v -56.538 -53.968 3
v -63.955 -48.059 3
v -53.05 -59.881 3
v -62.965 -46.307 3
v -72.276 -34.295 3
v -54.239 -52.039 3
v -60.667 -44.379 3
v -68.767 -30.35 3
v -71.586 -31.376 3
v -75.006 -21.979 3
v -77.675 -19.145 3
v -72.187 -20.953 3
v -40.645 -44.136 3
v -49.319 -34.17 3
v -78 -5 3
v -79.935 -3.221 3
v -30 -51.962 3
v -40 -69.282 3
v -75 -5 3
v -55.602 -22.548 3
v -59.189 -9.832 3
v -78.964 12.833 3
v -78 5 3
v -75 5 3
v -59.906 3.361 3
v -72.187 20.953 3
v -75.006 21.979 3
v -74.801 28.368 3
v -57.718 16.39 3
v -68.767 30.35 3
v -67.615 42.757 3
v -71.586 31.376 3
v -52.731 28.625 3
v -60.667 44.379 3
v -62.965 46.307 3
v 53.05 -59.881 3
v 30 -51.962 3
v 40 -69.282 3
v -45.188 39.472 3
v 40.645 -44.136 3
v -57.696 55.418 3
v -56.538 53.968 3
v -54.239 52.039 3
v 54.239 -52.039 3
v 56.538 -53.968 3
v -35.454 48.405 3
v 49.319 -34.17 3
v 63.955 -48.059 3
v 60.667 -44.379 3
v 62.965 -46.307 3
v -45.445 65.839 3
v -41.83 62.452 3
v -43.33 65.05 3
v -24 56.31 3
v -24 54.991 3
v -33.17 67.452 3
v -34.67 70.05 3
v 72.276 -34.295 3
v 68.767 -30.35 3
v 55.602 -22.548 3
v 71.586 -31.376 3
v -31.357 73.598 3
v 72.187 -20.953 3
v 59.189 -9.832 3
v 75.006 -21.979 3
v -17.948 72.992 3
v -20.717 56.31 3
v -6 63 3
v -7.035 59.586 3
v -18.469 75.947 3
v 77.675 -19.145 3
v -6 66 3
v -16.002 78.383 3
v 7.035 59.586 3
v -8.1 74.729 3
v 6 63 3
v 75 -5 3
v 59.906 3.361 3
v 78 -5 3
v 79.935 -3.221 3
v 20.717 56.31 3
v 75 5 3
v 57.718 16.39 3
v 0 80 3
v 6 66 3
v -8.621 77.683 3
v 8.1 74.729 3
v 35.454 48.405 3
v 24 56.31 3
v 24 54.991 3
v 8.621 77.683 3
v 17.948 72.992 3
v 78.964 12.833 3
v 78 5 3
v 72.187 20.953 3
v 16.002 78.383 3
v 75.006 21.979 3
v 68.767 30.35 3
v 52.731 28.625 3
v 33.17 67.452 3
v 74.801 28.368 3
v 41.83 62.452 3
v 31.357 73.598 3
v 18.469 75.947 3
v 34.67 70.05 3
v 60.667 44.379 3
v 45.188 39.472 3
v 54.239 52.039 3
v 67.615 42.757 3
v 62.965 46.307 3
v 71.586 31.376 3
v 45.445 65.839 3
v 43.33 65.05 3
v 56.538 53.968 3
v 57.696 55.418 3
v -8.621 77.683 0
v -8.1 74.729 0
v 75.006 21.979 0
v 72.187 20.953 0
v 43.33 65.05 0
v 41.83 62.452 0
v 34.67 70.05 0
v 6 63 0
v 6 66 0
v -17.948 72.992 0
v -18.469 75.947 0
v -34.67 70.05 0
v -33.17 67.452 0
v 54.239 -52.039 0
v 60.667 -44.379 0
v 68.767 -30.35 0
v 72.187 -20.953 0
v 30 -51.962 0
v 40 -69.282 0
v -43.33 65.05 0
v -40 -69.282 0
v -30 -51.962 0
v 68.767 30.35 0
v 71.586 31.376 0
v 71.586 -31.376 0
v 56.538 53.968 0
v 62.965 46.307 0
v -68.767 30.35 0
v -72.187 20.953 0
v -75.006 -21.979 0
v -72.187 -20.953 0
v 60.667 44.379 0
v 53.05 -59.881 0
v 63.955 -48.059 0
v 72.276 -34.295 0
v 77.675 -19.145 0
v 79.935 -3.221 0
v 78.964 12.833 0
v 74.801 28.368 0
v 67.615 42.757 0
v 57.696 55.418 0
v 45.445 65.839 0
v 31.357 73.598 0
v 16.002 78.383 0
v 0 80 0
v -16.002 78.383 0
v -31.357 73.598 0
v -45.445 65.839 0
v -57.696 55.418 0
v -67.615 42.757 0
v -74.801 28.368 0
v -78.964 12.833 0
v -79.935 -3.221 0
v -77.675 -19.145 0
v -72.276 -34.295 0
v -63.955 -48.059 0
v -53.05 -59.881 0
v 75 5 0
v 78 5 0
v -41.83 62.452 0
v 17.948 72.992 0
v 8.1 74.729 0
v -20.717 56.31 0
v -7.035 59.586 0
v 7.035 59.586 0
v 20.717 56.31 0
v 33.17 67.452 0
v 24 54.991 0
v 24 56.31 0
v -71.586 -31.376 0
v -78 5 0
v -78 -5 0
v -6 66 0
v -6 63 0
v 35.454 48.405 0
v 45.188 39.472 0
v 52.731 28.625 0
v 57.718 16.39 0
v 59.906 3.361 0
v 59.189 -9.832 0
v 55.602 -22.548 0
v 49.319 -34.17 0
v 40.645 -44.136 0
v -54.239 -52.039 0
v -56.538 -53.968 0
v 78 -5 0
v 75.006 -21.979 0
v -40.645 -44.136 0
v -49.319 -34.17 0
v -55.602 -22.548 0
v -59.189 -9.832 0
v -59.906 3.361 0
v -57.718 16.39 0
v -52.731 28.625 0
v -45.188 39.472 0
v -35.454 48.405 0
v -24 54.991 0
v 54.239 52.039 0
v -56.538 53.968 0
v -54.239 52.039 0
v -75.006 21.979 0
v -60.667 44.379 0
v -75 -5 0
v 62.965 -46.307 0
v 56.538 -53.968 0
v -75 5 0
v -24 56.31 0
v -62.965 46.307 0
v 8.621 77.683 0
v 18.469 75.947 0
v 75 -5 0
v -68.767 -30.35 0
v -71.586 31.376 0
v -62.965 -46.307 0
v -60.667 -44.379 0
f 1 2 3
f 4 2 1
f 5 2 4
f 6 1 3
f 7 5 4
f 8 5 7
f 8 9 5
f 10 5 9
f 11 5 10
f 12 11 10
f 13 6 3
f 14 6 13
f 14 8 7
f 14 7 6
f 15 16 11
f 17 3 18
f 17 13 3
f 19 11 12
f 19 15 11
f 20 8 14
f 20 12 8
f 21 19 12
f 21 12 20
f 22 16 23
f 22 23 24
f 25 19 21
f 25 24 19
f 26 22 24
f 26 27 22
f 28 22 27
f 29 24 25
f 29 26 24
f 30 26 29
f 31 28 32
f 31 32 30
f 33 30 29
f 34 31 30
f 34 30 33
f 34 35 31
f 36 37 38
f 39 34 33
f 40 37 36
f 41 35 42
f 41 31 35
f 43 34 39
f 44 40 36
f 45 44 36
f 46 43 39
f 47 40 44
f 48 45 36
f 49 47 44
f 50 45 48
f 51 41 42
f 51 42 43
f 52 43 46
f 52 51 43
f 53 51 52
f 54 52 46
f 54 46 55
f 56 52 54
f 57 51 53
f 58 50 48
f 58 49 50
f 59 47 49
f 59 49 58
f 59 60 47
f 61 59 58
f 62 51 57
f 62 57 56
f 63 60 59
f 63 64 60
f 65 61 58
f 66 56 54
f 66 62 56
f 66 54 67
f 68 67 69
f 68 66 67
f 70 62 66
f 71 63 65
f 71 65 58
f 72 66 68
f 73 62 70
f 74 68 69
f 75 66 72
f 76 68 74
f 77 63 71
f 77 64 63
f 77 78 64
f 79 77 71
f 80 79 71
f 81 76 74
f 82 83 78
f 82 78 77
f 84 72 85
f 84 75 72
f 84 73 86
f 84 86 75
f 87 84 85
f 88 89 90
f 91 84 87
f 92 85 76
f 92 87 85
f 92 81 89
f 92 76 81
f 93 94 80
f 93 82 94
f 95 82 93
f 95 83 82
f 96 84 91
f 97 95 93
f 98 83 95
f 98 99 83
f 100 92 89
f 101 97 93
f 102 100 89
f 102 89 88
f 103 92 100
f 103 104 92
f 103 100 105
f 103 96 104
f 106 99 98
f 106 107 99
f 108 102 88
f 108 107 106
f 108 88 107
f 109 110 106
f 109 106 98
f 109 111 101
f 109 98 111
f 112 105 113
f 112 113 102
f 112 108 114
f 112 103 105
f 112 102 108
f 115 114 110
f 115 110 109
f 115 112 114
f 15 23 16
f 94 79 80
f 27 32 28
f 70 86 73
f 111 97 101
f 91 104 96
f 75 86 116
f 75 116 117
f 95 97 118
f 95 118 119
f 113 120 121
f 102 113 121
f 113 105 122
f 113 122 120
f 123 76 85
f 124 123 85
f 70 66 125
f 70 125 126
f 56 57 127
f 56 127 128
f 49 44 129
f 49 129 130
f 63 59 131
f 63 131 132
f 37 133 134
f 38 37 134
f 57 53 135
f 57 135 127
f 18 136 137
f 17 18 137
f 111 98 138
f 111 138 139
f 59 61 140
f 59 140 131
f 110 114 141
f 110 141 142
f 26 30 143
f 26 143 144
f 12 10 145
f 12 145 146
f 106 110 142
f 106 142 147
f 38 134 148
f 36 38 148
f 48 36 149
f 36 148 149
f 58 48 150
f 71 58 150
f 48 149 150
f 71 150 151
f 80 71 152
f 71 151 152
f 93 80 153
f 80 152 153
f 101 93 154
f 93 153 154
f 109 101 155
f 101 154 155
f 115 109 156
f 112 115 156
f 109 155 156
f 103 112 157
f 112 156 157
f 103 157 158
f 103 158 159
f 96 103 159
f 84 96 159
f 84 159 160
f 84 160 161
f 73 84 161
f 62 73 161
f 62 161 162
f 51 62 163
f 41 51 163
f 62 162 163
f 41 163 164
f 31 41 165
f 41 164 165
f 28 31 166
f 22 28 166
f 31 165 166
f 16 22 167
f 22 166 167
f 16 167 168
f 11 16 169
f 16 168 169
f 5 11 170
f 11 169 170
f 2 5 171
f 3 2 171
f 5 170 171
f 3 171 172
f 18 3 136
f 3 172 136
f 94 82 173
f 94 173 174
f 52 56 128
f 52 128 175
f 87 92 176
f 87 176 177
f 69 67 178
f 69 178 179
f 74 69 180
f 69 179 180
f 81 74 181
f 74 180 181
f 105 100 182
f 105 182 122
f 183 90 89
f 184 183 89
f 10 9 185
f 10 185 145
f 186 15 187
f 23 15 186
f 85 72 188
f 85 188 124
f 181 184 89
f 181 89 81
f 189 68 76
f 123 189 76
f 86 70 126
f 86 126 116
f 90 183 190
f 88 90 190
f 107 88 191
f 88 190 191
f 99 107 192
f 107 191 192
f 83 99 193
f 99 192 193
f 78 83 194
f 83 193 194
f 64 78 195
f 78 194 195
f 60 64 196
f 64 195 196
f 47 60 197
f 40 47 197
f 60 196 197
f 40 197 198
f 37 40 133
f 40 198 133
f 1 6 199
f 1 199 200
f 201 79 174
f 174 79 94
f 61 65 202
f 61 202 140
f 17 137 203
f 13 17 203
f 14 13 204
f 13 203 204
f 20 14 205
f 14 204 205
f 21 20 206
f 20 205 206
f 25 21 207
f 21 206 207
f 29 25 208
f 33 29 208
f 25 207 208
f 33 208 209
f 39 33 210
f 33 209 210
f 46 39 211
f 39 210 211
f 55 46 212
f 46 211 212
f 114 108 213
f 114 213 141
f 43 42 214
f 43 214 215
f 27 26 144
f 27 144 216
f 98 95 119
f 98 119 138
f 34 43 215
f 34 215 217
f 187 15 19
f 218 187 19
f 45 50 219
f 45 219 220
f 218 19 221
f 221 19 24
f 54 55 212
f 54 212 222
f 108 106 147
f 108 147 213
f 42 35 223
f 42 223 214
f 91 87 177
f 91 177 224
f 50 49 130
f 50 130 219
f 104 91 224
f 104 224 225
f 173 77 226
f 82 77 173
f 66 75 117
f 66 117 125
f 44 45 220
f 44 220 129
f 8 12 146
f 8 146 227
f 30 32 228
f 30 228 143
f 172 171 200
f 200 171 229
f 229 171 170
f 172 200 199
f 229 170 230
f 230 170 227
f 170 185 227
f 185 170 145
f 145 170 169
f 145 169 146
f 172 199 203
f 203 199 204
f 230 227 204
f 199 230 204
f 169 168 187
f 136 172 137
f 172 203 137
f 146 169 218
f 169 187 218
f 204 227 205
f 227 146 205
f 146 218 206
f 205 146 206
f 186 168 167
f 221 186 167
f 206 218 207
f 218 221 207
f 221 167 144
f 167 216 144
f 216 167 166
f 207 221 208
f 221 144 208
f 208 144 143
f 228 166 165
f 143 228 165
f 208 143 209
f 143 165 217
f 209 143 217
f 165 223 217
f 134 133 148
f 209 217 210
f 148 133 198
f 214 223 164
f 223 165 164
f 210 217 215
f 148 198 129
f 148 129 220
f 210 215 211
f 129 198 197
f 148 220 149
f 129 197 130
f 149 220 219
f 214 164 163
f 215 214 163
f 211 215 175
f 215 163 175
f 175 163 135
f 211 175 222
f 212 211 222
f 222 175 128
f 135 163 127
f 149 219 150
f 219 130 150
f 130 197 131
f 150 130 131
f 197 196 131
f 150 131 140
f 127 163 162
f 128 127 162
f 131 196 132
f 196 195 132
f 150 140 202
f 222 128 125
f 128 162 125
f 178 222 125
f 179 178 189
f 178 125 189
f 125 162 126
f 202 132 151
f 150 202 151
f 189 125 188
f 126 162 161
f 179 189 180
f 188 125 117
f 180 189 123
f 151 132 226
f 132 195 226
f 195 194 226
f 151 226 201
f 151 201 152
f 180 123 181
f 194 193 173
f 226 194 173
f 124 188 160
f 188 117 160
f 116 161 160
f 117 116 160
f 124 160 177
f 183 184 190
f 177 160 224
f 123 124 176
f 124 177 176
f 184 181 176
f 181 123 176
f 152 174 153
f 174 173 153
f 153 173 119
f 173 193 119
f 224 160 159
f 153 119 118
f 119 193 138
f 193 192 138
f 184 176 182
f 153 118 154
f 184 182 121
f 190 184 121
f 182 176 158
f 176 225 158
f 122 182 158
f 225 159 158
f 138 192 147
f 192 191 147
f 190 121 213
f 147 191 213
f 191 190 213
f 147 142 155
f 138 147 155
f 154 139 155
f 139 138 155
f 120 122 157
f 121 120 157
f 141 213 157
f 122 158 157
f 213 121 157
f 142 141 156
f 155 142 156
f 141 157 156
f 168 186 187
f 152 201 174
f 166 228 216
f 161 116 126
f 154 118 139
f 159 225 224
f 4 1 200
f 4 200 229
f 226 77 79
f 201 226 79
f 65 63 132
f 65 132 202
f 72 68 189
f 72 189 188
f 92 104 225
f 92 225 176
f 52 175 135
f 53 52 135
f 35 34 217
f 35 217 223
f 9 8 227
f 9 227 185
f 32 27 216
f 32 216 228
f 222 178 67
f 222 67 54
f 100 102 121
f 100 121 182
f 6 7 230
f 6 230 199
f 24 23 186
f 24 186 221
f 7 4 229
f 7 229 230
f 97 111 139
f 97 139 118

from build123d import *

# Parameters (mm, degrees)
P_IDAT_VYSUNUT_M1_DEPTH  = 3
SKICA3_W                 = 12
SKICA3_H                 = 3
SKICA3_W_2               = 3
SKICA3_H_2               = 10
ODEBRAT_VYSUNUT_M1_DEPTH = 3
SKICA4_W                 = 48
SKICA4_H                 = 3.5
ODEBRAT_VYSUNUT_M3_DEPTH = 3


with BuildPart() as part:
    # Skica1 → Přidat vysunutím1 (new body)
    with BuildSketch(Plane.XY):
        with BuildLine():
            Line((-40, -69.282032303), (-30, -51.961524227))
            ThreePointArc((-30, -51.961524227), (0, 60), (30, -51.961524227))
            Line((30, -51.961524227), (40, -69.282032303))
            ThreePointArc((40, -69.282032303), (0, 80), (-40, -69.282032303))
        make_face()
    extrude(amount=P_IDAT_VYSUNUT_M1_DEPTH)

    # Skica3 → Odebrat vysunutím1 (cut)
    with BuildSketch(Plane.XY.offset(3)):
        Polygon((-43.330127019, 65.049981495), (-34.669872981, 70.049981495), (-33.169872981, 67.451905284), (-41.830127019, 62.451905284), align=None)
        with Locations((0, 64.5)):
            Rectangle(SKICA3_W, SKICA3_H)
        Polygon((-18.468596623, 75.946763847), (-8.620519093, 77.683245623), (-8.09957456, 74.728822364), (-17.94765209, 72.992340588), align=None)
        Polygon((8.620519093, 77.683245623), (18.468596623, 75.946763847), (17.94765209, 72.992340588), (8.09957456, 74.728822364), align=None)
        Polygon((34.669872981, 70.049981495), (43.330127019, 65.049981495), (41.830127019, 62.451905284), (33.169872981, 67.451905284), align=None)
        Polygon((56.537528515, 53.967655771), (62.965404612, 46.30721134), (60.667271282, 44.378848511), (54.239395185, 52.039292942), align=None)
        Polygon((71.585923705, 31.376034283), (75.006125138, 21.979108075), (72.187047276, 20.953047646), (68.766845842, 30.349973853), align=None)
        with Locations((76.5, 0)):
            Rectangle(SKICA3_W_2, SKICA3_H_2)
        Polygon((75.006125138, -21.979108075), (71.585923705, -31.376034283), (68.766845842, -30.349973853), (72.187047276, -20.953047645), align=None)
        Polygon((62.965404612, -46.30721134), (56.537528515, -53.967655771), (54.239395186, -52.039292942), (60.667271282, -44.378848511), align=None)
        Polygon((-56.537528515, -53.967655771), (-62.965404612, -46.30721134), (-60.667271282, -44.378848511), (-54.239395185, -52.039292942), align=None)
        Polygon((-71.585923705, -31.376034283), (-75.006125138, -21.979108075), (-72.187047276, -20.953047645), (-68.766845842, -30.349973853), align=None)
        with Locations((-76.5, 0)):
            Rectangle(SKICA3_W_2, SKICA3_H_2)
        Polygon((-75.006125138, 21.979108075), (-71.585923705, 31.376034283), (-68.766845842, 30.349973853), (-72.187047276, 20.953047645), align=None)
        Polygon((-62.965404612, 46.30721134), (-56.537528515, 53.967655771), (-54.239395185, 52.039292942), (-60.667271282, 44.378848511), align=None)
    extrude(amount=-ODEBRAT_VYSUNUT_M1_DEPTH, mode=Mode.SUBTRACT)

    # Skica4 → Odebrat vysunutím3 (cut)
    with BuildSketch(Plane(origin=(0, 0, 0), x_dir=(-1, 0, 0), z_dir=(0, 0, -1))):
        with Locations((0, 54.56)):
            Rectangle(SKICA4_W, SKICA4_H)
    extrude(amount=-ODEBRAT_VYSUNUT_M3_DEPTH, mode=Mode.SUBTRACT)


solid = part.part
